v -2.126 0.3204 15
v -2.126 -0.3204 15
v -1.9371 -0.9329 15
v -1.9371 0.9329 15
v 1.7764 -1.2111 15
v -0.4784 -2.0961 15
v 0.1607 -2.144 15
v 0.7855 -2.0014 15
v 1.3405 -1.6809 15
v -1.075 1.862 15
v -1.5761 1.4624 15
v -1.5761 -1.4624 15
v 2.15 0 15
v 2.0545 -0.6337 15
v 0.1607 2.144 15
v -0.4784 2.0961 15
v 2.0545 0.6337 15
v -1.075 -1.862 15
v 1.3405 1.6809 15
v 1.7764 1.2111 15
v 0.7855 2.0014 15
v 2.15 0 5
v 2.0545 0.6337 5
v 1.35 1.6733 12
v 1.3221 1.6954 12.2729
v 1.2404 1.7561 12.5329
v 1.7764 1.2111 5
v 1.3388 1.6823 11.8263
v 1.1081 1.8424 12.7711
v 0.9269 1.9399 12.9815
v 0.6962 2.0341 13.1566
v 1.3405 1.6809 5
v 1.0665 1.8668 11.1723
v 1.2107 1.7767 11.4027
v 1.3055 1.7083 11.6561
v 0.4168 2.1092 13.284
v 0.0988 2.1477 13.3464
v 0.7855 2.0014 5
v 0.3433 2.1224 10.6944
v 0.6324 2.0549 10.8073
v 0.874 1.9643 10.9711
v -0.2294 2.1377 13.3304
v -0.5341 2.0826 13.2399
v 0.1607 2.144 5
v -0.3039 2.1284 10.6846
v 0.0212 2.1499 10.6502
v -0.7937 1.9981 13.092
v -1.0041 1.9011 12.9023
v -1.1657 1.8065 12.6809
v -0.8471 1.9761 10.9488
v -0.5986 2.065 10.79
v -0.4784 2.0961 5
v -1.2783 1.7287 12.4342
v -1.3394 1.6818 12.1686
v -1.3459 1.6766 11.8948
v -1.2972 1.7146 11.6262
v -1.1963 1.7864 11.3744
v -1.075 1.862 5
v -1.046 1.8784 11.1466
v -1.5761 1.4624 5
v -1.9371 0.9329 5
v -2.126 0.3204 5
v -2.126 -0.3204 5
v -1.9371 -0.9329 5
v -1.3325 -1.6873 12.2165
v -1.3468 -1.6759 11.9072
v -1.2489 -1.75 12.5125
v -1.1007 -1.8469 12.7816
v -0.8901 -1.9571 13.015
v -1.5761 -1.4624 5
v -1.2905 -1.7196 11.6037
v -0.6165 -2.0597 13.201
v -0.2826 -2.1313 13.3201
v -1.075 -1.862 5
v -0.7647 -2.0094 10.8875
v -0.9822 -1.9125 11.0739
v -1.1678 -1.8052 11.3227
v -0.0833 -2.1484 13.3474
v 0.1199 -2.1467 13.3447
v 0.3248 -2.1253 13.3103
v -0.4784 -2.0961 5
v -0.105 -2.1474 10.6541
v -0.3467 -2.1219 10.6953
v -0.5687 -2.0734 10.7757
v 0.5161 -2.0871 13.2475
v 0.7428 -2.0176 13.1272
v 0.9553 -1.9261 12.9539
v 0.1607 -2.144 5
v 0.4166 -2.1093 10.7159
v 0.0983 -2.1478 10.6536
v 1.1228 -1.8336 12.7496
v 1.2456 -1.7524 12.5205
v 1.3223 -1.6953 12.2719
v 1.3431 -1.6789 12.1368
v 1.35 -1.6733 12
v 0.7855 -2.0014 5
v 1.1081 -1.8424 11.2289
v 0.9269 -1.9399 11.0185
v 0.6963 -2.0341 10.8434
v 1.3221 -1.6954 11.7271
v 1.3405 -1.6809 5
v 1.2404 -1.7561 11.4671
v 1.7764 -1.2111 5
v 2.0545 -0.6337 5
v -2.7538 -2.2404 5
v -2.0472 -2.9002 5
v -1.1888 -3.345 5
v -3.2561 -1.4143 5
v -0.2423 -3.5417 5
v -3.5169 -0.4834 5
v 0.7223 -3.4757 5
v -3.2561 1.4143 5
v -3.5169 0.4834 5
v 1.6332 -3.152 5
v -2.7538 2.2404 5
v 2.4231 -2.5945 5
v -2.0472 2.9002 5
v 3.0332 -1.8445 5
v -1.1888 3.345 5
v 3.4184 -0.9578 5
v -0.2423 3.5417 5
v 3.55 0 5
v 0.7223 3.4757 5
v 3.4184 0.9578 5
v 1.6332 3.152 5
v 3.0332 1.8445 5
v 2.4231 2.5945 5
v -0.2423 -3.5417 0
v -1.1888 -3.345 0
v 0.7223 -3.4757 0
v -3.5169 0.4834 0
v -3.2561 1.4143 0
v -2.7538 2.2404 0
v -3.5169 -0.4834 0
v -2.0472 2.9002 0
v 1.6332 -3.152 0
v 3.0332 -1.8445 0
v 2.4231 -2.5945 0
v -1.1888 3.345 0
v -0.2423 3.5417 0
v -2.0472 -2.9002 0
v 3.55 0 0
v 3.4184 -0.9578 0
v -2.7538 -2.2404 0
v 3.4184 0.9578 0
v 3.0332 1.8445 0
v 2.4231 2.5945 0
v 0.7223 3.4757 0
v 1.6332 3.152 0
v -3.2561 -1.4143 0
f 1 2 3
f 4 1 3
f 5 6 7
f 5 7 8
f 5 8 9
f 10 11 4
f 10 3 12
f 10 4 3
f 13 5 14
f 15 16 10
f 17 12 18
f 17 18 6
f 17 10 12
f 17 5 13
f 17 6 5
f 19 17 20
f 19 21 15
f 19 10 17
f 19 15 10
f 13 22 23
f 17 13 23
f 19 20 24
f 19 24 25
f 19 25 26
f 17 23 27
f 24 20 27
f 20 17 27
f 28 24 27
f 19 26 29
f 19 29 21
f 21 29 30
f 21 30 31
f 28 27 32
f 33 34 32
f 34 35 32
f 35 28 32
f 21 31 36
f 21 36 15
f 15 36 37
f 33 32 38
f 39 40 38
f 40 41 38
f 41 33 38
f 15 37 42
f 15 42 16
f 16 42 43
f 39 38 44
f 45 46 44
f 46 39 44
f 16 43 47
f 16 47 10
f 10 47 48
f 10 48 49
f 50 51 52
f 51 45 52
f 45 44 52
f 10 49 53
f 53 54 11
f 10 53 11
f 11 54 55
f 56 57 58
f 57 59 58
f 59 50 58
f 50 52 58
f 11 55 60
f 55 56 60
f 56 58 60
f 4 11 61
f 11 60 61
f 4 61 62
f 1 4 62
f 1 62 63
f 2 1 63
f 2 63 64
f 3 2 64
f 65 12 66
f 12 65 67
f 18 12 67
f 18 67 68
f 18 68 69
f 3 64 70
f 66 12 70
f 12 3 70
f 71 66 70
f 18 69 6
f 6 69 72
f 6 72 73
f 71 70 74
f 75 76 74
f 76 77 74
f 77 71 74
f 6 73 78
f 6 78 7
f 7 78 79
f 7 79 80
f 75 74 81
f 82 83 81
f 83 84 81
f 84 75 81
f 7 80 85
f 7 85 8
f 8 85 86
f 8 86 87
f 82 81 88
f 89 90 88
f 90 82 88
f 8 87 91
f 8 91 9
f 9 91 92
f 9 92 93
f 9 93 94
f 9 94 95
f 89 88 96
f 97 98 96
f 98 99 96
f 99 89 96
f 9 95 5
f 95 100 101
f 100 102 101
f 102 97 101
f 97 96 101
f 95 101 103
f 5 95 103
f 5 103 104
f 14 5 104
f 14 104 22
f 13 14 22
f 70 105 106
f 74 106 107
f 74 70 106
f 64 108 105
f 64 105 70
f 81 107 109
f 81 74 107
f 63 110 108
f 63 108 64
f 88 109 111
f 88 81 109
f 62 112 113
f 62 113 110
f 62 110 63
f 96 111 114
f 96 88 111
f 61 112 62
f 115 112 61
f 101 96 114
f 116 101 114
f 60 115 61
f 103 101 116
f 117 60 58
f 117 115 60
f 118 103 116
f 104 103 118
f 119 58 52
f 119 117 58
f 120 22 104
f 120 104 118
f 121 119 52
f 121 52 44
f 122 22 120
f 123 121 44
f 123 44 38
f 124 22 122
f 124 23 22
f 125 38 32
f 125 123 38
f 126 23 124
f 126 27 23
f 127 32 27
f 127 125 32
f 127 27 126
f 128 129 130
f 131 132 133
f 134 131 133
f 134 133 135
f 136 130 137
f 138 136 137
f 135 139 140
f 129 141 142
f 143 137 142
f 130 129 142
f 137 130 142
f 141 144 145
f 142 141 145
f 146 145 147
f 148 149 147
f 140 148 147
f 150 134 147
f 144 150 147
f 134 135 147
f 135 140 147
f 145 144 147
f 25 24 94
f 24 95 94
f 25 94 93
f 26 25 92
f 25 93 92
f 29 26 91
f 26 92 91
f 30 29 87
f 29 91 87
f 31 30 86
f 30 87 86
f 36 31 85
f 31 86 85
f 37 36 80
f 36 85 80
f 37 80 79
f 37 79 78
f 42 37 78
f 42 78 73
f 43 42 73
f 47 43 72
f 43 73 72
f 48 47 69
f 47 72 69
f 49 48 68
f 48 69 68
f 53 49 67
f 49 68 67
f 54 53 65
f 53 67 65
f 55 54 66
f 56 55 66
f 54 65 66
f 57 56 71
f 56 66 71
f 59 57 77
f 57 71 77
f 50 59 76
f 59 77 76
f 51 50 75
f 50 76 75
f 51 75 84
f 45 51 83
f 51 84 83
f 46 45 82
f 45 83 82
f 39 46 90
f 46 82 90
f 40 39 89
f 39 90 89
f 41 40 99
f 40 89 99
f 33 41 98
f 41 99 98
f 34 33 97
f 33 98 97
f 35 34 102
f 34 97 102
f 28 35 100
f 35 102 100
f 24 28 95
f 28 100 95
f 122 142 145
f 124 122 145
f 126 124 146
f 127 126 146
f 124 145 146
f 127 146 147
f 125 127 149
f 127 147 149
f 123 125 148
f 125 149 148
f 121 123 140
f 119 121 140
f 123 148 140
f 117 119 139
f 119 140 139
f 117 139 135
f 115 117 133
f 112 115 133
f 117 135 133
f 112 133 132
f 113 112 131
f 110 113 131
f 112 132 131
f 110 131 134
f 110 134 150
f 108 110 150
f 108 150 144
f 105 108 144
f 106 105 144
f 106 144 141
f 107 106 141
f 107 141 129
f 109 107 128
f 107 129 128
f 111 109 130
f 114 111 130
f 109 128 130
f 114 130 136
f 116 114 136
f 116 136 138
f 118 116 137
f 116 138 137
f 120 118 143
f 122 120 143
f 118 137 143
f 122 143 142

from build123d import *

# Parameters (mm, degrees)
F0_R          = 3.55
F1_DEPTH      = 5
F2_R          = 2.15
F3_DEPTH      = 10
F4_R          = 1.35
F5_DEPTH      = 2.15
F5_DEPTH_BACK = 2.15


with BuildPart() as f1:
    # F0 (on Top) → F1 (new body)
    with BuildSketch(Plane.XY):
        Circle(F0_R)
    extrude(amount=F1_DEPTH)

    # F2 (on face) → F3 (join)
    with BuildSketch(Plane.XY.offset(5)):
        Circle(F2_R)
    extrude(amount=F3_DEPTH)

    # F4 (on Front) → F5 (cut, two sides)
    with BuildSketch(Plane.XZ) as f5_sk:
        with Locations((0, 12)):
            Circle(F4_R)
    extrude(amount=-F5_DEPTH, mode=Mode.SUBTRACT)
    extrude(f5_sk.sketch, amount=F5_DEPTH_BACK, mode=Mode.SUBTRACT)


solid = f1.part
